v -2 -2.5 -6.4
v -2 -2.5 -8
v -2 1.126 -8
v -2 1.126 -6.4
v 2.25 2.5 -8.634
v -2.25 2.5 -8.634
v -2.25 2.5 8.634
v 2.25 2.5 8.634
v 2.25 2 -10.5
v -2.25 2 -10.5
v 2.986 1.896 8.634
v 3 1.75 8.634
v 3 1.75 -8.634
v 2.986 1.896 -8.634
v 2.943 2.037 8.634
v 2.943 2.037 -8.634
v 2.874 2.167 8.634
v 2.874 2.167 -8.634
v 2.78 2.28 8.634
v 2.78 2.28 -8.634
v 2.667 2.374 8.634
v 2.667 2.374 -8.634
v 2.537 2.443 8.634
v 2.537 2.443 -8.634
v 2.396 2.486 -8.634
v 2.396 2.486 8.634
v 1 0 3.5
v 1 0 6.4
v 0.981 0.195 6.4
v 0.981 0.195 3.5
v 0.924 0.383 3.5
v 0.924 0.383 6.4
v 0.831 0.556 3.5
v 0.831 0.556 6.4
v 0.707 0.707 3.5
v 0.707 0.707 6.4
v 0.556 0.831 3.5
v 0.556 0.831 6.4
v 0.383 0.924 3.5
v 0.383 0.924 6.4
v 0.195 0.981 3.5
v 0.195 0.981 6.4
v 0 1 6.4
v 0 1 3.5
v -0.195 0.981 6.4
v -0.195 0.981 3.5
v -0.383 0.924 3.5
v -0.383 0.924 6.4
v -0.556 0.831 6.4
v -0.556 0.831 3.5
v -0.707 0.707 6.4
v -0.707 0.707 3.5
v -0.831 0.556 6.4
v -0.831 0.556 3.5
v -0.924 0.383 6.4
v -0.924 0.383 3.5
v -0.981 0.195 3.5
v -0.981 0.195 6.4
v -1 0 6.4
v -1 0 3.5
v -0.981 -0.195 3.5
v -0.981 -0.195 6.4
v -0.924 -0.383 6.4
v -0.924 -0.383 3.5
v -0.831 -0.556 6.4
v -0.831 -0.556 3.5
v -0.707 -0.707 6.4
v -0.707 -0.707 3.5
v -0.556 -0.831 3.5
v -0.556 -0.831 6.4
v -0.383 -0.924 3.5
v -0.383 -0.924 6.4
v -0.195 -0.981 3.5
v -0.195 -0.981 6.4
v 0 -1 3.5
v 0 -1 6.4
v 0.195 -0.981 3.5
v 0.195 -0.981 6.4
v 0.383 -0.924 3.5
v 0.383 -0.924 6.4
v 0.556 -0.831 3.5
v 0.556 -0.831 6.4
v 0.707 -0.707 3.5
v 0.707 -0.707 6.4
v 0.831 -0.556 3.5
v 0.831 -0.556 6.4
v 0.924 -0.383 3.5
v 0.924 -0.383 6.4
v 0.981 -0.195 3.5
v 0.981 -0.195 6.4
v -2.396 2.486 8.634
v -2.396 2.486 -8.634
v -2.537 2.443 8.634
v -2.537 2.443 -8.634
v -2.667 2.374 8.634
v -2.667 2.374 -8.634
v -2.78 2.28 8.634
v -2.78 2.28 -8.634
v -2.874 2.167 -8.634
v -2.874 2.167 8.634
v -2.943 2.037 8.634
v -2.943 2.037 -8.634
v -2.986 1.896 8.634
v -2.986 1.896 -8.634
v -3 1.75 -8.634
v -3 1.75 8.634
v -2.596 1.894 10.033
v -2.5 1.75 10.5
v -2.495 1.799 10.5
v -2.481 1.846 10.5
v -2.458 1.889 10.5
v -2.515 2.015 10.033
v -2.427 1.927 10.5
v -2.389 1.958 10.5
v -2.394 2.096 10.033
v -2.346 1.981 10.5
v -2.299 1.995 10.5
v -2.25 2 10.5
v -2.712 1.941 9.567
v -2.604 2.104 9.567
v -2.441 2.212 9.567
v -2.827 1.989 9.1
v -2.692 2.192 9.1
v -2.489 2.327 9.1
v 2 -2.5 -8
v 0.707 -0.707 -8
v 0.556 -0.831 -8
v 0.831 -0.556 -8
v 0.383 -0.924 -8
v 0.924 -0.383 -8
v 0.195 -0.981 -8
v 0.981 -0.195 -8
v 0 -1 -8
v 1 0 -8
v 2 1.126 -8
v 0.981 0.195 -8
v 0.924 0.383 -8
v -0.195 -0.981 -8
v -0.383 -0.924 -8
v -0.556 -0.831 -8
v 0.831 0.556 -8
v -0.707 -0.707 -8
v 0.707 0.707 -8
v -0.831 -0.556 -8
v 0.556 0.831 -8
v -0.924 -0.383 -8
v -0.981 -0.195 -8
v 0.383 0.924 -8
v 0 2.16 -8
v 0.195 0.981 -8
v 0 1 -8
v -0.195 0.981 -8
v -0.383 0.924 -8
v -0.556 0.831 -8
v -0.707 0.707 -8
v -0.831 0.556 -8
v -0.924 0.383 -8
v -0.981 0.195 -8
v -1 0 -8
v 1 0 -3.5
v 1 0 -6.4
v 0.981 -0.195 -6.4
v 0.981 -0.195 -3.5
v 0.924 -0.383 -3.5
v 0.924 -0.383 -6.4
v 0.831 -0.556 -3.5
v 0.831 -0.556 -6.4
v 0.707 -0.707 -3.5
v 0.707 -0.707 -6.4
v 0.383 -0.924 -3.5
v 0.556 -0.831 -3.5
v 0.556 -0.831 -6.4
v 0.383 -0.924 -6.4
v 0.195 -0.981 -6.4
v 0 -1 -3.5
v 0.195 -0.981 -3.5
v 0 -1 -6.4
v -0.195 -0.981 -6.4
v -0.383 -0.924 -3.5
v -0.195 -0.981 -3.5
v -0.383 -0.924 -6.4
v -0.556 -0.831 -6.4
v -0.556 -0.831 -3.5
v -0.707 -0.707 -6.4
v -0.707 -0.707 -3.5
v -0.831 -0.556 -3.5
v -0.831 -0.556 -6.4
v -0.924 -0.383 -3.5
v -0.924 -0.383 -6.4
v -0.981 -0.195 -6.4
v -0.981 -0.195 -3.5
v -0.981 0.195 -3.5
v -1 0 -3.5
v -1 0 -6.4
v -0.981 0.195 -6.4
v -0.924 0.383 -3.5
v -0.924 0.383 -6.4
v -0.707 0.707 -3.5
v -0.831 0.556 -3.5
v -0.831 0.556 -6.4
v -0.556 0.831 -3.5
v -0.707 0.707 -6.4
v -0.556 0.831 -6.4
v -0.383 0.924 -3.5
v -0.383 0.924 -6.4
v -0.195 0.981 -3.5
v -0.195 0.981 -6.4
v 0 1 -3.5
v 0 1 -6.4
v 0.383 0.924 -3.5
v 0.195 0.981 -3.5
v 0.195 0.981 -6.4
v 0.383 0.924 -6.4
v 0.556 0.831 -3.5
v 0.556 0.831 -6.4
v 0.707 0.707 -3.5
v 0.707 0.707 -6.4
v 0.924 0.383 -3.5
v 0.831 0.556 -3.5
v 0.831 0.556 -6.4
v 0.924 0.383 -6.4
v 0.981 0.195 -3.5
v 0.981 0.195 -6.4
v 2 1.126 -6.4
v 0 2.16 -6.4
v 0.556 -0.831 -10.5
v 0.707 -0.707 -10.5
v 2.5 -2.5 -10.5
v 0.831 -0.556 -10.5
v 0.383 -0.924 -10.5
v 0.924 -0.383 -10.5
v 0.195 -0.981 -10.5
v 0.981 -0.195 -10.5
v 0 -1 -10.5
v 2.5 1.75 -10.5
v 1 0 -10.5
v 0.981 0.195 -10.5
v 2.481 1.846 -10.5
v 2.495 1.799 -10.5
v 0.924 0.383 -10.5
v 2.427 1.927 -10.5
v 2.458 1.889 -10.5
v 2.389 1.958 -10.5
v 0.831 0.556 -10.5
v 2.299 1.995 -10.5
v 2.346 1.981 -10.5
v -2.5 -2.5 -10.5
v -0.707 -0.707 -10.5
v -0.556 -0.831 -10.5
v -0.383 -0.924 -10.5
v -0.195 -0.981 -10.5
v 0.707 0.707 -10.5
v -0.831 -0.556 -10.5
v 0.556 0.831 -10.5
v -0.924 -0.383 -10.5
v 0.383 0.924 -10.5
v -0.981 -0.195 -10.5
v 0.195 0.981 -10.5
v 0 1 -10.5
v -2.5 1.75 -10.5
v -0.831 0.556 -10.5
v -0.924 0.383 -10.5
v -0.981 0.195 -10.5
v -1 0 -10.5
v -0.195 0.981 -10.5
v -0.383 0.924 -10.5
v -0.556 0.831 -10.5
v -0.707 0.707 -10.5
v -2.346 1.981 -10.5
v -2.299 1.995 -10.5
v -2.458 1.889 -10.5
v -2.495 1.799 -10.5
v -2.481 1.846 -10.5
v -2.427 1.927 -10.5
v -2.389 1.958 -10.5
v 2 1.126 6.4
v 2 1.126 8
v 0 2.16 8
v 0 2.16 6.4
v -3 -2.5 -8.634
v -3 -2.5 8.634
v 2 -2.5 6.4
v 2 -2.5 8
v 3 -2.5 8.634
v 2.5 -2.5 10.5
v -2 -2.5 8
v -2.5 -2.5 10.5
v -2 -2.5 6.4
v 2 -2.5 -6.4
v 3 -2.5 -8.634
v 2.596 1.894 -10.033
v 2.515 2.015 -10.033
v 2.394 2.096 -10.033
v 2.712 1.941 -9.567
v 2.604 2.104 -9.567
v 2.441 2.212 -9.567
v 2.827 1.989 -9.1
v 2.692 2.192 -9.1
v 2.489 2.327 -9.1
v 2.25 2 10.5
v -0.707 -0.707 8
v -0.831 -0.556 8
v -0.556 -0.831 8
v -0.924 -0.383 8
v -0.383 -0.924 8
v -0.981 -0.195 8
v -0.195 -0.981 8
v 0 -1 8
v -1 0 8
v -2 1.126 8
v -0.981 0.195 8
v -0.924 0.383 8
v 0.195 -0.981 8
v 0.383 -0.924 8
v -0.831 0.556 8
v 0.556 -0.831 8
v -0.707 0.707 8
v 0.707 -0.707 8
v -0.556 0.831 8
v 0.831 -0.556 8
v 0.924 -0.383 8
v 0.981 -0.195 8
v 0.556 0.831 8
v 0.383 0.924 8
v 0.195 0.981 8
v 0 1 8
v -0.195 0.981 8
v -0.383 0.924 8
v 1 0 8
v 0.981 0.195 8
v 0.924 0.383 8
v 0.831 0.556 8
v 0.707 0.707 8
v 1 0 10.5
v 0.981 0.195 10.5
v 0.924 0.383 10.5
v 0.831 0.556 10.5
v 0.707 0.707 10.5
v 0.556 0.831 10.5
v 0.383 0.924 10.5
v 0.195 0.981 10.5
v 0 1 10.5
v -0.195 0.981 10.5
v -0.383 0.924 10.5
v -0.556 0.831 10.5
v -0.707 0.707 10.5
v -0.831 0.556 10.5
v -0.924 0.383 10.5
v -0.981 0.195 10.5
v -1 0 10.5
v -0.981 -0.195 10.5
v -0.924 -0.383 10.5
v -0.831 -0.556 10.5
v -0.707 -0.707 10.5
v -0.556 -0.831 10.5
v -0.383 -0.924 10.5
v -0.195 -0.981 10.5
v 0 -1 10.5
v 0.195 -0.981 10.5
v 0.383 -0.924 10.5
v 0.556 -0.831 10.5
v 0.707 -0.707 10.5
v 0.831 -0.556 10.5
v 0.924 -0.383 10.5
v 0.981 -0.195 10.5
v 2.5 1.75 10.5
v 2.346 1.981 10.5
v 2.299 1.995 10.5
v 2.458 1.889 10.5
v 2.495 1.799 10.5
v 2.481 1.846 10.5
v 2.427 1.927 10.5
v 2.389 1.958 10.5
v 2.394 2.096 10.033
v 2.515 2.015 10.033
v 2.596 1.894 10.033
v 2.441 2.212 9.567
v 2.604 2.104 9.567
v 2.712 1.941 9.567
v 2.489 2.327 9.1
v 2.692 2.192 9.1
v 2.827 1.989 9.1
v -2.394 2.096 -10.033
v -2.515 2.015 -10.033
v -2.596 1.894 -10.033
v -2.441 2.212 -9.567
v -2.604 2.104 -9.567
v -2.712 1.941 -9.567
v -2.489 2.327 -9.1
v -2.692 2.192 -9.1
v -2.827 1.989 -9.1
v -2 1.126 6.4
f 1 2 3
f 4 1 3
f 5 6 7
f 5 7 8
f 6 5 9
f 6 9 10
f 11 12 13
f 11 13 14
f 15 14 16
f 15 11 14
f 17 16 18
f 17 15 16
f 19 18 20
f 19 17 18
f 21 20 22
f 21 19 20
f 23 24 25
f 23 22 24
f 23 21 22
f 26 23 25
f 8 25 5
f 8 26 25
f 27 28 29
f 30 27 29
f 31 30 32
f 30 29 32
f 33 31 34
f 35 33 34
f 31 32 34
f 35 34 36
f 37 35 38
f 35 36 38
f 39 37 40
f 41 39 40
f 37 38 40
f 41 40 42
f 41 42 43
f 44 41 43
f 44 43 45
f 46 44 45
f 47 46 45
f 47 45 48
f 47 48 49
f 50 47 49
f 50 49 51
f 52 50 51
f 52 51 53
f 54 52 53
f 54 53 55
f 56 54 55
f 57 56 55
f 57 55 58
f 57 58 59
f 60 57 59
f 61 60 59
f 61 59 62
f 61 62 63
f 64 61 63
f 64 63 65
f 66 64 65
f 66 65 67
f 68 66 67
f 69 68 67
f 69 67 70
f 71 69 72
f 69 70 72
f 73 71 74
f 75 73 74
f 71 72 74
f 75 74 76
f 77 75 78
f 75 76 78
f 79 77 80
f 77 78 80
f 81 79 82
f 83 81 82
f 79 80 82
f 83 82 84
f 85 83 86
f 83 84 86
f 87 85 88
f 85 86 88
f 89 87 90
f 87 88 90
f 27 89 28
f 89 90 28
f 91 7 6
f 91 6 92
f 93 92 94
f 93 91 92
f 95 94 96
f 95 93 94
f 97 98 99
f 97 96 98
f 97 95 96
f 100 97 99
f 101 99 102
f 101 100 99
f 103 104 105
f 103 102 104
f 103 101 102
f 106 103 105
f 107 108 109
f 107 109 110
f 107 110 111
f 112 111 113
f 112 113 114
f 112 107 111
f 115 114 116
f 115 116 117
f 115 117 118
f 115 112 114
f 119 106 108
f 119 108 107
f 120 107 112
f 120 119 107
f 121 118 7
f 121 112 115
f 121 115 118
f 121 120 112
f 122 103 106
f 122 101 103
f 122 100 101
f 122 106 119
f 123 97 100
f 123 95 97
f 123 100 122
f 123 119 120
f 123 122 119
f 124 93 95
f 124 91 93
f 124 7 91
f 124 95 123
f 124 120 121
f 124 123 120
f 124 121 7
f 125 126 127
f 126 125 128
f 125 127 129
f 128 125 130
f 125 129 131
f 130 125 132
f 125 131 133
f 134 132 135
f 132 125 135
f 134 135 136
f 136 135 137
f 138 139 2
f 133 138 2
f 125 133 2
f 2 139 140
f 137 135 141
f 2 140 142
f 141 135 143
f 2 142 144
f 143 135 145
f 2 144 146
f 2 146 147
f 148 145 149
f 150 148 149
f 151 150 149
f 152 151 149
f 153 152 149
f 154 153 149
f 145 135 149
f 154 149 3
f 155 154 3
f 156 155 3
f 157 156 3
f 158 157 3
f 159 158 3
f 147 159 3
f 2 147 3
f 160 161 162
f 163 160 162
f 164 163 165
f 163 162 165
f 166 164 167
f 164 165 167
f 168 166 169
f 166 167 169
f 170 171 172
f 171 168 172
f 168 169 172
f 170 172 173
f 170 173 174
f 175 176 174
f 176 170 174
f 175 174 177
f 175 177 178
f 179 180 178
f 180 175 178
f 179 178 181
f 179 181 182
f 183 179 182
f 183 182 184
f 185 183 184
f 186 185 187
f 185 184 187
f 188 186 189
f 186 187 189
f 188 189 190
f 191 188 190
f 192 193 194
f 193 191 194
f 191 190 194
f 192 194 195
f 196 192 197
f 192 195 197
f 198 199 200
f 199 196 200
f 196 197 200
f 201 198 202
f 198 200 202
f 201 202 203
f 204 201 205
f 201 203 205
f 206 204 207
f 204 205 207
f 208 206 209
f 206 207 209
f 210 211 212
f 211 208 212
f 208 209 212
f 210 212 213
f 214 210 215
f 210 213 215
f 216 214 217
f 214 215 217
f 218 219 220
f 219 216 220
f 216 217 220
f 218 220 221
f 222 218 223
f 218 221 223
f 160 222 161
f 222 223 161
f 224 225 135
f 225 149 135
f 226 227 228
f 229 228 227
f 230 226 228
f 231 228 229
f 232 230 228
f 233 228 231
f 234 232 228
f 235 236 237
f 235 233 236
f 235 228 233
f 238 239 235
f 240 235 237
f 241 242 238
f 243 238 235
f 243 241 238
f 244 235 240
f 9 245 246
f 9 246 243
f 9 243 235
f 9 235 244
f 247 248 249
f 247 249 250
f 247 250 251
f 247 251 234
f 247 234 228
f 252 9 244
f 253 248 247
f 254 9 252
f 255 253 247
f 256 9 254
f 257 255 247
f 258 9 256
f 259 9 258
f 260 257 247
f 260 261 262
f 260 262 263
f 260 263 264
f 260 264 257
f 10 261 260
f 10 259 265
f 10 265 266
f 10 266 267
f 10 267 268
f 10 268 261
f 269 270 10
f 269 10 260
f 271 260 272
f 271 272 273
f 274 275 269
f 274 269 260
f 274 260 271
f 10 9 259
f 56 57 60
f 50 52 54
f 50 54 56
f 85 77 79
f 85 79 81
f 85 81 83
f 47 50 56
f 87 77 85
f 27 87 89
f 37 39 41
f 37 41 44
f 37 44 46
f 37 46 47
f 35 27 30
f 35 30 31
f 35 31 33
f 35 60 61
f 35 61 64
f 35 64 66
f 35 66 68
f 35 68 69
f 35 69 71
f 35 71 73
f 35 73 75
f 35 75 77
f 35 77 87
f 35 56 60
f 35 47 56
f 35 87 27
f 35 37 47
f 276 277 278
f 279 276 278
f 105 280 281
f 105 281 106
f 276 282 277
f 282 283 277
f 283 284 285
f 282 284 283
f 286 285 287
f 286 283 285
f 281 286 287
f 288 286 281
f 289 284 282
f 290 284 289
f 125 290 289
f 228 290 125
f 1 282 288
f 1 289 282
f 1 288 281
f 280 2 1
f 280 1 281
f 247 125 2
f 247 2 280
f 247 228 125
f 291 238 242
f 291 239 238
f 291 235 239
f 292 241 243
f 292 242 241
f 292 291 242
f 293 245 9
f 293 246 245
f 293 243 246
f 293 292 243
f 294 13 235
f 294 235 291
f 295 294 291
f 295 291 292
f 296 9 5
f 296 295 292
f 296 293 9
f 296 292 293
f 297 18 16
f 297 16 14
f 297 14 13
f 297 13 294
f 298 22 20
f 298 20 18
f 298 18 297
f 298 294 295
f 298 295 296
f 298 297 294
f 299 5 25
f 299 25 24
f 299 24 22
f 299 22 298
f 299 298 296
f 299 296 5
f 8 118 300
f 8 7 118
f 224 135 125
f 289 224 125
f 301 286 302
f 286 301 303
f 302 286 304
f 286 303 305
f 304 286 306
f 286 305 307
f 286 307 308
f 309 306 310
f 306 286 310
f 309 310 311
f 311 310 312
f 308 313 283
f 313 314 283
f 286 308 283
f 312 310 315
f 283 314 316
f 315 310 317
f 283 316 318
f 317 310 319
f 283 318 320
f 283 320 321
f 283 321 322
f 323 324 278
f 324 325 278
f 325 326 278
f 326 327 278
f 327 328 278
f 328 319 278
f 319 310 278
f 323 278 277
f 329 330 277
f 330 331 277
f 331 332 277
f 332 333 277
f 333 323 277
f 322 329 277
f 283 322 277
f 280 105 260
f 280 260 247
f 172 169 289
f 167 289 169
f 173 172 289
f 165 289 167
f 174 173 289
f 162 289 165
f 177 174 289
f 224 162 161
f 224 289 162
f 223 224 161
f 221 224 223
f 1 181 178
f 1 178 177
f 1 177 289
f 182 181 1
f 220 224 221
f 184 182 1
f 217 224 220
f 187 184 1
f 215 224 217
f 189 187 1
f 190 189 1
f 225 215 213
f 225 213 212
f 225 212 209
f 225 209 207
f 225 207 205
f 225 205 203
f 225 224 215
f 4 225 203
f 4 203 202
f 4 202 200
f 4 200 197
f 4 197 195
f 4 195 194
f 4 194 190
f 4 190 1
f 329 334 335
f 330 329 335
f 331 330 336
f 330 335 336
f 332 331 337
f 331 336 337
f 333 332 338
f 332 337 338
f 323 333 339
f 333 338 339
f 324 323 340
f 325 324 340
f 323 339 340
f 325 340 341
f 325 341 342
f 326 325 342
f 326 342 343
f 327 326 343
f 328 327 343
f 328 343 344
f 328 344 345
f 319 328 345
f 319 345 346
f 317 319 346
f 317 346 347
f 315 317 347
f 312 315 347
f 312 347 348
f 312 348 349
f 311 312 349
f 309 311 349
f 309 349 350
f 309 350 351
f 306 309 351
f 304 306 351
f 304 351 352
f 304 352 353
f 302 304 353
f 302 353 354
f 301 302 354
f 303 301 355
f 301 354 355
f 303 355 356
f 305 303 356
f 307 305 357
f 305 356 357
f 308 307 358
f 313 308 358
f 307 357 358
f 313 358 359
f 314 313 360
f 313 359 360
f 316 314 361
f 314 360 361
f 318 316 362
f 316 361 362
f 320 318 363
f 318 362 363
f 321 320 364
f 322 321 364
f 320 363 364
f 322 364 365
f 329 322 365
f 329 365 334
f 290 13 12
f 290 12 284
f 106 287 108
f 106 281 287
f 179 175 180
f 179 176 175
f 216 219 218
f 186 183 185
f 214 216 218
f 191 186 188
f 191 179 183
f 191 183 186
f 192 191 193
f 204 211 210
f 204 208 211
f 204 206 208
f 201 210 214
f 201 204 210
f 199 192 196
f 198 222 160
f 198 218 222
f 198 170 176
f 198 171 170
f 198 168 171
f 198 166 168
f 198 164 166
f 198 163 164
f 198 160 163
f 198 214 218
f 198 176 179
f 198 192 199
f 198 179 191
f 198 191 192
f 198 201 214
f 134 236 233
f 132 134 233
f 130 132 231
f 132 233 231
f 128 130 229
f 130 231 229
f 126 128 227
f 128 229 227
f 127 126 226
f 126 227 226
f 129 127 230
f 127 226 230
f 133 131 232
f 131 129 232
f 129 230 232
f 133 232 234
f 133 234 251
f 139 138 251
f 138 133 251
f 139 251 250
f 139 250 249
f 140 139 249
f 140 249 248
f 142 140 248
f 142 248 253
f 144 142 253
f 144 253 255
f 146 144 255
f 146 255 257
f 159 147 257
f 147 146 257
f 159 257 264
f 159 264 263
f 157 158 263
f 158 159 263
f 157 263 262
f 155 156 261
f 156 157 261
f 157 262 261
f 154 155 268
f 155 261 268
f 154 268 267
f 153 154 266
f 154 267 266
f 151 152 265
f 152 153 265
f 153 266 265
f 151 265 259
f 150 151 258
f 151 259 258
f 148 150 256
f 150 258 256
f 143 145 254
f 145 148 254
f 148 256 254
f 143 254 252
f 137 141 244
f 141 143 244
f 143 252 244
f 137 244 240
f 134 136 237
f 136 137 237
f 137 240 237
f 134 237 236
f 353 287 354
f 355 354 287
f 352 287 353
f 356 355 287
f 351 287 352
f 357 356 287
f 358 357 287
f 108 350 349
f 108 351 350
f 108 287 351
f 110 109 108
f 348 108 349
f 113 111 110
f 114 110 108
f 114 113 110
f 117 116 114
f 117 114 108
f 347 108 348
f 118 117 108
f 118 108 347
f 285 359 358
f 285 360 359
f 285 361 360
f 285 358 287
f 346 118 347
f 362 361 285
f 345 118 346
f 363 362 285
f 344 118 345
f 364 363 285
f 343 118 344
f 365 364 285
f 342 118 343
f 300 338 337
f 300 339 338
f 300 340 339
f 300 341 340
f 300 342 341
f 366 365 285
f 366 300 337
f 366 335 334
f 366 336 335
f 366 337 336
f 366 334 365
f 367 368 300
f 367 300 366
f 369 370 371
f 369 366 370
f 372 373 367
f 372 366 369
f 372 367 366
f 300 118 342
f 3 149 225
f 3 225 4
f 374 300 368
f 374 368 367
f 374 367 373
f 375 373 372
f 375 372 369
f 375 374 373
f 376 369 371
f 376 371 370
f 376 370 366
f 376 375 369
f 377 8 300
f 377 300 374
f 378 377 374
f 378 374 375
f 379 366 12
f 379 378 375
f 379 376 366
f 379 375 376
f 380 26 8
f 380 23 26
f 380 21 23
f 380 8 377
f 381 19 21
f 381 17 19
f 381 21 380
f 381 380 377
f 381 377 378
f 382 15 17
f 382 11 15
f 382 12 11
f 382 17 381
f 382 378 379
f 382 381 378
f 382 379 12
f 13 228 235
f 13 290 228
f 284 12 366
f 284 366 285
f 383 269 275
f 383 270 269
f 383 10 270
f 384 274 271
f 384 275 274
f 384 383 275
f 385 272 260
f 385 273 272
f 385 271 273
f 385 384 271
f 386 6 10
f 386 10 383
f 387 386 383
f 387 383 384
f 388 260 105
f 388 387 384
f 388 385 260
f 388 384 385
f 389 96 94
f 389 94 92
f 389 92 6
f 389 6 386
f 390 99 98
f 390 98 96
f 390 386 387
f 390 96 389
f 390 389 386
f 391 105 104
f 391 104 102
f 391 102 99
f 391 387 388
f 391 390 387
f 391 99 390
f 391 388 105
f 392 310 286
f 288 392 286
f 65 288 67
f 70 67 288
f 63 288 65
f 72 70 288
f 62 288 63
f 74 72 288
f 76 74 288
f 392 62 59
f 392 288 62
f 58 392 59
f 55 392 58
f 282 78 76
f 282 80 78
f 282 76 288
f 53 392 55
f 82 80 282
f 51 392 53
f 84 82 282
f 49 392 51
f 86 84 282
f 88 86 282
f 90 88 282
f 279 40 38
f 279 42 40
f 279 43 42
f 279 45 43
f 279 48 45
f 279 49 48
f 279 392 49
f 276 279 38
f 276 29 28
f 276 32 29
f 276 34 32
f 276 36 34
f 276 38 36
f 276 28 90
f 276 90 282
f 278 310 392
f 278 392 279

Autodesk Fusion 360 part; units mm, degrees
sketch "Sketch1" plane through (0, 0, 0) normal (0, 0, 1) x (1, 0, 0)
  line L0 (3, -2.5) -> (-3, -2.5)
  line L1 (-3, -2.5) -> (-3, 2.5)
  line L2 (-3, 2.5) -> (3, 2.5)
  line L3 (3, 2.5) -> (3, -2.5)
  line L4 (3, -2.5) -> (-3, 2.5) construction
  line L5 (-3, -2.5) -> (3, 2.5) construction
  dimension "dWidth" = 6
  dimension "d2" = 5
extrude "Extrude1" add sketch "Sketch1" along normal blind 10.5
sketch "Sketch2" plane through (0, 0, 10.5) normal (0, 0, 1) x (1, 0, 0)
  line L0 (3, 2.5) -> (-3, 2.5)
  line L1 (-3, 2.5) -> (-3, -2.5)
  line L2 (-3, -2.5) -> (3, -2.5)
  line L3 (3, -2.5) -> (3, 2.5)
  circle A0 centre (0, 0) radius 1
  dimension "d5" = 2
extrude "Extrude2" cut sketch "Sketch2" against normal blind 7 contours A0
ref_plane "WorkPlane1" through (0, 0, 8) normal (0, 0, 1) x (1, 0, 0)
sketch "Sketch3" plane through (0, 0, 8) normal (0, 0, 1) x (1, 0, 0)
  line L0 (2, -2.16) -> (-2, -2.16) construction
  line L1 (-2, -2.16) -> (-2, 2.16) construction
  line L2 (-2, 2.16) -> (2, 2.16) construction
  line L3 (2, 2.16) -> (2, -2.16) construction
  line L4 (2, -2.16) -> (-2, 2.16) construction
  line L5 (-2, -2.16) -> (2, 2.16) construction
  line L6 (-2, 0) -> (2, 0) construction
  line L7 (2, 1.1258) -> (2, -1.1258)
  line L8 (-2, 1.1258) -> (-2, -1.1258)
  line L9 (0, 2.16) -> (0, -2.16) construction
  line L10 (-2, 1.1258) -> (0, 2.16)
  line L11 (2, 1.1258) -> (0, 2.16)
  line L12 (-2, -1.1258) -> (0, -2.16) construction
  line L13 (0, -2.16) -> (2, -1.1258) construction
  line L14 (-2, -1.1258) -> (-2, -2.5)
  line L15 (-2, -2.5) -> (2, -2.5)
  line L16 (2, -2.5) -> (2, -1.1258)
  line L17 (3, -2.5) -> (-3, -2.5)
  dimension "d9" = 4
  dimension "d10" = 4.32
extrude "Extrude3" cut sketch "Sketch3" against normal blind 1.6
fillet "Fillet1" radius 0.75 2 edges at (-3, 2.5, 5.25) (3, 2.5, 5.25)
chamfer "Chamfer2" distance 0.5 angle 75 2 edges at (3, -0.375, 10.5) (-3, -0.375, 10.5) measured on face at (-2.3296, -0.2997, 10.5) measured on face at (-2.3296, -0.2997, 10.5) tangent chain off
mirror "Mirror2" about plane through (0, 0, 0) normal (0, 0, 1) of bodies 1 merged
properties part number "Configuration 2"
